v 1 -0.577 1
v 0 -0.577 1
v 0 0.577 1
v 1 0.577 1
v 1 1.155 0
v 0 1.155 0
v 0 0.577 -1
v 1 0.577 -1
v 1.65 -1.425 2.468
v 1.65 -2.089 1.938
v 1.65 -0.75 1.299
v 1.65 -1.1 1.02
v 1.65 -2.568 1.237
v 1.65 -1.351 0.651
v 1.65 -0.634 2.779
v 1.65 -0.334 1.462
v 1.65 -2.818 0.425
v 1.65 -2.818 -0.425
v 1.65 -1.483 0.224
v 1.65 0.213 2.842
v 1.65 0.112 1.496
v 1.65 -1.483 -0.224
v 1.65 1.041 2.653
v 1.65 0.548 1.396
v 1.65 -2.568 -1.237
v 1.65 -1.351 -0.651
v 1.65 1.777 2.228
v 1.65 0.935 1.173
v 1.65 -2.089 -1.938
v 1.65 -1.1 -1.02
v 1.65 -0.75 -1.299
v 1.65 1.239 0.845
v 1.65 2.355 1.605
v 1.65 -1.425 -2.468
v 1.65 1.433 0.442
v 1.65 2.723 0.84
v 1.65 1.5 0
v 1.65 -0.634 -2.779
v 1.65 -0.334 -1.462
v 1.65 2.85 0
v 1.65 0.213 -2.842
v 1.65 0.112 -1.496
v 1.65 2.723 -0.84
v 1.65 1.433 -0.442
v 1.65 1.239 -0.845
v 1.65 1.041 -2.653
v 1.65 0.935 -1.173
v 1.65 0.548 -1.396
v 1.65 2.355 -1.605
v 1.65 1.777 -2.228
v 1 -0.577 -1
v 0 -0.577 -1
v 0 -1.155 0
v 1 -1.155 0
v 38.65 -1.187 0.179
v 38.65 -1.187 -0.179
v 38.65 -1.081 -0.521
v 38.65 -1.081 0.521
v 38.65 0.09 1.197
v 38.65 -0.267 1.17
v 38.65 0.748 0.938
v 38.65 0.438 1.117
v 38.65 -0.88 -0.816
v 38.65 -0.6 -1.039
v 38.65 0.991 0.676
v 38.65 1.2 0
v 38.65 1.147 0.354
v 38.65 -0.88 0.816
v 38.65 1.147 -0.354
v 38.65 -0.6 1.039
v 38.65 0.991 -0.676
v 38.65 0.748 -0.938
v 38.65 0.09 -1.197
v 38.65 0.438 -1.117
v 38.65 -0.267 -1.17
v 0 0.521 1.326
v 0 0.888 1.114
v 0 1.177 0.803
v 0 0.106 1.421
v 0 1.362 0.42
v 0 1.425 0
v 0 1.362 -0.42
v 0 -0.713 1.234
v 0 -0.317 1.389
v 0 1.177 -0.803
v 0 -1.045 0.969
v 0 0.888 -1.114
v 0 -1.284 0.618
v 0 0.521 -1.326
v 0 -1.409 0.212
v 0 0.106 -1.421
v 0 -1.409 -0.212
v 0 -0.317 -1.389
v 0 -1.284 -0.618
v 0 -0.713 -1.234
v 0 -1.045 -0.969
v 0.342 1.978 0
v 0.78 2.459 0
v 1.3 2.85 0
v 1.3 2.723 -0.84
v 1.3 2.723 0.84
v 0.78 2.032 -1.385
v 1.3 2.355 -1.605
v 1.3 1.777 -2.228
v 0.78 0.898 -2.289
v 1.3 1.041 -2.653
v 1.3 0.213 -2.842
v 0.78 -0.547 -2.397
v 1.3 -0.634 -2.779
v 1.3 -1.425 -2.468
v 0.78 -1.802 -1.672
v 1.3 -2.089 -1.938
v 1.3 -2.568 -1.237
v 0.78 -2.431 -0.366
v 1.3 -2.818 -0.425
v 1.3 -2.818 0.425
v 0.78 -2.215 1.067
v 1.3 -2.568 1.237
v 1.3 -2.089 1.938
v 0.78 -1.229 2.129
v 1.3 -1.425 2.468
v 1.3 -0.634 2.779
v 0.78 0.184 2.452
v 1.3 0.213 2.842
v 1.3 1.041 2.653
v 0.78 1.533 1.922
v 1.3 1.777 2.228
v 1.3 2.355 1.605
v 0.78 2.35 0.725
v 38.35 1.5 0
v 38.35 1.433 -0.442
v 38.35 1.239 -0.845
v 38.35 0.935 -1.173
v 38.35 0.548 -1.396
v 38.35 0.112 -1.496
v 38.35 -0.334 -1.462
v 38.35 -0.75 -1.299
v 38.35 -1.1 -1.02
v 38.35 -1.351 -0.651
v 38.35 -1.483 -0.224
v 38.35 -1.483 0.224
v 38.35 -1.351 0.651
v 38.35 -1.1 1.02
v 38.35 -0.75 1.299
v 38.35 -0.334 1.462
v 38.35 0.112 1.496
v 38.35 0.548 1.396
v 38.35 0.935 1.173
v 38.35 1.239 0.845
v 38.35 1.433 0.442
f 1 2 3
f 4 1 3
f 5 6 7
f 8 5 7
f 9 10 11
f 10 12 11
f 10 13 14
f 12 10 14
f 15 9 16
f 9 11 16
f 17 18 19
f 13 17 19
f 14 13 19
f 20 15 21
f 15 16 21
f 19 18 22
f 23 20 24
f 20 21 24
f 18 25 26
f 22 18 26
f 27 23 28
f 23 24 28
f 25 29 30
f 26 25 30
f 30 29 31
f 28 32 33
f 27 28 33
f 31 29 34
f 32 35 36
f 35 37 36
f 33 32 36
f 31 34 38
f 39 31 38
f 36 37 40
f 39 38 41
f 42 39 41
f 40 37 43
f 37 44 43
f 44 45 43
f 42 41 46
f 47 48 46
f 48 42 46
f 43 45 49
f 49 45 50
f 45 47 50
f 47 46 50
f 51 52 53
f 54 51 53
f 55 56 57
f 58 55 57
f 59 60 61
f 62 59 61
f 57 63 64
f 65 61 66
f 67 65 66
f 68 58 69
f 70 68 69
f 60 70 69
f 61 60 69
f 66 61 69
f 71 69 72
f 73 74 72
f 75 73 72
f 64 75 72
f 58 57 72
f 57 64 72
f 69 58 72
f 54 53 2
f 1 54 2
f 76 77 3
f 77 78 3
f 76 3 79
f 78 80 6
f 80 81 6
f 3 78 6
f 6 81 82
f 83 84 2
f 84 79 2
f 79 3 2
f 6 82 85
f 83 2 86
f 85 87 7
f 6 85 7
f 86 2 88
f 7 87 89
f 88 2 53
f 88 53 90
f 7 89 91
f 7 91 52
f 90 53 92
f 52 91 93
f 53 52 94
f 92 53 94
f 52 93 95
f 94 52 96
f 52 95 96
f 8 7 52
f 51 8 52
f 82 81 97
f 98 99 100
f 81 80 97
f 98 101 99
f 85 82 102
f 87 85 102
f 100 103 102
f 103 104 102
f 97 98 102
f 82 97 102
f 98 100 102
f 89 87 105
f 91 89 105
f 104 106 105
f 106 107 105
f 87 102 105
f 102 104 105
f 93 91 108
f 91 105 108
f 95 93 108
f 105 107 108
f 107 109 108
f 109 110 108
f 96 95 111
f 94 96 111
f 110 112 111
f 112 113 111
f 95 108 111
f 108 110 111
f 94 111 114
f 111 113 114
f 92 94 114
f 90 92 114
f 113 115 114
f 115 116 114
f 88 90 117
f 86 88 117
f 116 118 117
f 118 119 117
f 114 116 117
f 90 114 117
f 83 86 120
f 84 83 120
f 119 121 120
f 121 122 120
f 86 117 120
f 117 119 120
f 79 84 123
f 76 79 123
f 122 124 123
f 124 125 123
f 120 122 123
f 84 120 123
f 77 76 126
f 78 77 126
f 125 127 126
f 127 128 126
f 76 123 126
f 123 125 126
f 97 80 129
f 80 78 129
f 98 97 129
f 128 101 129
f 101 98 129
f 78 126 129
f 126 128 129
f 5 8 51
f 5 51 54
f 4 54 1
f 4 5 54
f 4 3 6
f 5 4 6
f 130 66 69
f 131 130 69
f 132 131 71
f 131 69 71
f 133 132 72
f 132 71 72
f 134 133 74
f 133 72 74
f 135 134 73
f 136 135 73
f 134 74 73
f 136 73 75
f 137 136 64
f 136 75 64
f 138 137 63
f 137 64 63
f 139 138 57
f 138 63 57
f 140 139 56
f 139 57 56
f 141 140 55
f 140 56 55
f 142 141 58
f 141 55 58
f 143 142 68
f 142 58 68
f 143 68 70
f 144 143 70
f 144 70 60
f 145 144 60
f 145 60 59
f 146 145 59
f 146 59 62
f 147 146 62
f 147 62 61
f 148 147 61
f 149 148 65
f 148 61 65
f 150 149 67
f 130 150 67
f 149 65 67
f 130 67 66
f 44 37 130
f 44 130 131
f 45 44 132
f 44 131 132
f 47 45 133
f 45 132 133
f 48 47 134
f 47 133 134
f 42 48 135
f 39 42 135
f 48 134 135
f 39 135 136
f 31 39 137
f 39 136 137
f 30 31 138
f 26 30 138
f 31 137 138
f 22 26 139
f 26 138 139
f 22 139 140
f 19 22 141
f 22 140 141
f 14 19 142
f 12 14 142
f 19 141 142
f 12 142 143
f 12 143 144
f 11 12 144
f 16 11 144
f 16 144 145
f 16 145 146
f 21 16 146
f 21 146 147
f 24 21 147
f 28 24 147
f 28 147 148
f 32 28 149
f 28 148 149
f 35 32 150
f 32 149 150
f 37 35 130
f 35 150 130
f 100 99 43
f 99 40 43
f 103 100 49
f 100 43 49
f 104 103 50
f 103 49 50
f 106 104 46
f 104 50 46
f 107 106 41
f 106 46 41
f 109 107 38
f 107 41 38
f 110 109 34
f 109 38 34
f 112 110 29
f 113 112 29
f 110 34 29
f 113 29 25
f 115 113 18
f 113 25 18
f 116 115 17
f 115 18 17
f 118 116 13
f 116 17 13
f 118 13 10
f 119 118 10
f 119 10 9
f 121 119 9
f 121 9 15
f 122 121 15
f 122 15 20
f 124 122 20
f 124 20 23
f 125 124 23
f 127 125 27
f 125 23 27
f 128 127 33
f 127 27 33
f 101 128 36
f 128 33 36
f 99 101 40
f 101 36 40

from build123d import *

# Parameters (mm, degrees)
CHAMFER1_SIZE      = 0.3
CUT_EXTRUDE1_DEPTH = 1


with BuildPart() as part:
    # Sketch1 → Revolve1 (revolve)
    with BuildSketch(Plane.XY):
        with BuildLine():
            Line((38.65, 0), (0, 0))
            Line((0, 0), (0, 1.425))
            ThreePointArc((0, 1.425), (0.549895392, 2.228823502), (1.3, 2.85))
            Line((1.3, 2.85), (1.65, 2.85))
            Line((1.65, 2.85), (1.65, 1.5))
            Line((1.65, 1.5), (38.65, 1.5))
            Line((38.65, 1.5), (38.65, 0))
        make_face()
    revolve(axis=Axis((38.65, 0, 0), (-1, 0, 0)))

    # Chamfer1
    chamfer1_edges = [part.edges().sort_by_distance(p)[0] for p in [
        (38.65, -1.5, 0),
    ]]
    chamfer(chamfer1_edges, length=CHAMFER1_SIZE)

    # Sketch2 → Cut-Extrude1 (cut)
    with BuildSketch(Plane.ZY):
        Polygon((0, 1.154700538), (-1, 0.577350269), (-1, -0.577350269), (0, -1.154700538), (1, -0.577350269), (1, 0.577350269), align=None)
    extrude(amount=-CUT_EXTRUDE1_DEPTH, mode=Mode.SUBTRACT)


solid = part.part
